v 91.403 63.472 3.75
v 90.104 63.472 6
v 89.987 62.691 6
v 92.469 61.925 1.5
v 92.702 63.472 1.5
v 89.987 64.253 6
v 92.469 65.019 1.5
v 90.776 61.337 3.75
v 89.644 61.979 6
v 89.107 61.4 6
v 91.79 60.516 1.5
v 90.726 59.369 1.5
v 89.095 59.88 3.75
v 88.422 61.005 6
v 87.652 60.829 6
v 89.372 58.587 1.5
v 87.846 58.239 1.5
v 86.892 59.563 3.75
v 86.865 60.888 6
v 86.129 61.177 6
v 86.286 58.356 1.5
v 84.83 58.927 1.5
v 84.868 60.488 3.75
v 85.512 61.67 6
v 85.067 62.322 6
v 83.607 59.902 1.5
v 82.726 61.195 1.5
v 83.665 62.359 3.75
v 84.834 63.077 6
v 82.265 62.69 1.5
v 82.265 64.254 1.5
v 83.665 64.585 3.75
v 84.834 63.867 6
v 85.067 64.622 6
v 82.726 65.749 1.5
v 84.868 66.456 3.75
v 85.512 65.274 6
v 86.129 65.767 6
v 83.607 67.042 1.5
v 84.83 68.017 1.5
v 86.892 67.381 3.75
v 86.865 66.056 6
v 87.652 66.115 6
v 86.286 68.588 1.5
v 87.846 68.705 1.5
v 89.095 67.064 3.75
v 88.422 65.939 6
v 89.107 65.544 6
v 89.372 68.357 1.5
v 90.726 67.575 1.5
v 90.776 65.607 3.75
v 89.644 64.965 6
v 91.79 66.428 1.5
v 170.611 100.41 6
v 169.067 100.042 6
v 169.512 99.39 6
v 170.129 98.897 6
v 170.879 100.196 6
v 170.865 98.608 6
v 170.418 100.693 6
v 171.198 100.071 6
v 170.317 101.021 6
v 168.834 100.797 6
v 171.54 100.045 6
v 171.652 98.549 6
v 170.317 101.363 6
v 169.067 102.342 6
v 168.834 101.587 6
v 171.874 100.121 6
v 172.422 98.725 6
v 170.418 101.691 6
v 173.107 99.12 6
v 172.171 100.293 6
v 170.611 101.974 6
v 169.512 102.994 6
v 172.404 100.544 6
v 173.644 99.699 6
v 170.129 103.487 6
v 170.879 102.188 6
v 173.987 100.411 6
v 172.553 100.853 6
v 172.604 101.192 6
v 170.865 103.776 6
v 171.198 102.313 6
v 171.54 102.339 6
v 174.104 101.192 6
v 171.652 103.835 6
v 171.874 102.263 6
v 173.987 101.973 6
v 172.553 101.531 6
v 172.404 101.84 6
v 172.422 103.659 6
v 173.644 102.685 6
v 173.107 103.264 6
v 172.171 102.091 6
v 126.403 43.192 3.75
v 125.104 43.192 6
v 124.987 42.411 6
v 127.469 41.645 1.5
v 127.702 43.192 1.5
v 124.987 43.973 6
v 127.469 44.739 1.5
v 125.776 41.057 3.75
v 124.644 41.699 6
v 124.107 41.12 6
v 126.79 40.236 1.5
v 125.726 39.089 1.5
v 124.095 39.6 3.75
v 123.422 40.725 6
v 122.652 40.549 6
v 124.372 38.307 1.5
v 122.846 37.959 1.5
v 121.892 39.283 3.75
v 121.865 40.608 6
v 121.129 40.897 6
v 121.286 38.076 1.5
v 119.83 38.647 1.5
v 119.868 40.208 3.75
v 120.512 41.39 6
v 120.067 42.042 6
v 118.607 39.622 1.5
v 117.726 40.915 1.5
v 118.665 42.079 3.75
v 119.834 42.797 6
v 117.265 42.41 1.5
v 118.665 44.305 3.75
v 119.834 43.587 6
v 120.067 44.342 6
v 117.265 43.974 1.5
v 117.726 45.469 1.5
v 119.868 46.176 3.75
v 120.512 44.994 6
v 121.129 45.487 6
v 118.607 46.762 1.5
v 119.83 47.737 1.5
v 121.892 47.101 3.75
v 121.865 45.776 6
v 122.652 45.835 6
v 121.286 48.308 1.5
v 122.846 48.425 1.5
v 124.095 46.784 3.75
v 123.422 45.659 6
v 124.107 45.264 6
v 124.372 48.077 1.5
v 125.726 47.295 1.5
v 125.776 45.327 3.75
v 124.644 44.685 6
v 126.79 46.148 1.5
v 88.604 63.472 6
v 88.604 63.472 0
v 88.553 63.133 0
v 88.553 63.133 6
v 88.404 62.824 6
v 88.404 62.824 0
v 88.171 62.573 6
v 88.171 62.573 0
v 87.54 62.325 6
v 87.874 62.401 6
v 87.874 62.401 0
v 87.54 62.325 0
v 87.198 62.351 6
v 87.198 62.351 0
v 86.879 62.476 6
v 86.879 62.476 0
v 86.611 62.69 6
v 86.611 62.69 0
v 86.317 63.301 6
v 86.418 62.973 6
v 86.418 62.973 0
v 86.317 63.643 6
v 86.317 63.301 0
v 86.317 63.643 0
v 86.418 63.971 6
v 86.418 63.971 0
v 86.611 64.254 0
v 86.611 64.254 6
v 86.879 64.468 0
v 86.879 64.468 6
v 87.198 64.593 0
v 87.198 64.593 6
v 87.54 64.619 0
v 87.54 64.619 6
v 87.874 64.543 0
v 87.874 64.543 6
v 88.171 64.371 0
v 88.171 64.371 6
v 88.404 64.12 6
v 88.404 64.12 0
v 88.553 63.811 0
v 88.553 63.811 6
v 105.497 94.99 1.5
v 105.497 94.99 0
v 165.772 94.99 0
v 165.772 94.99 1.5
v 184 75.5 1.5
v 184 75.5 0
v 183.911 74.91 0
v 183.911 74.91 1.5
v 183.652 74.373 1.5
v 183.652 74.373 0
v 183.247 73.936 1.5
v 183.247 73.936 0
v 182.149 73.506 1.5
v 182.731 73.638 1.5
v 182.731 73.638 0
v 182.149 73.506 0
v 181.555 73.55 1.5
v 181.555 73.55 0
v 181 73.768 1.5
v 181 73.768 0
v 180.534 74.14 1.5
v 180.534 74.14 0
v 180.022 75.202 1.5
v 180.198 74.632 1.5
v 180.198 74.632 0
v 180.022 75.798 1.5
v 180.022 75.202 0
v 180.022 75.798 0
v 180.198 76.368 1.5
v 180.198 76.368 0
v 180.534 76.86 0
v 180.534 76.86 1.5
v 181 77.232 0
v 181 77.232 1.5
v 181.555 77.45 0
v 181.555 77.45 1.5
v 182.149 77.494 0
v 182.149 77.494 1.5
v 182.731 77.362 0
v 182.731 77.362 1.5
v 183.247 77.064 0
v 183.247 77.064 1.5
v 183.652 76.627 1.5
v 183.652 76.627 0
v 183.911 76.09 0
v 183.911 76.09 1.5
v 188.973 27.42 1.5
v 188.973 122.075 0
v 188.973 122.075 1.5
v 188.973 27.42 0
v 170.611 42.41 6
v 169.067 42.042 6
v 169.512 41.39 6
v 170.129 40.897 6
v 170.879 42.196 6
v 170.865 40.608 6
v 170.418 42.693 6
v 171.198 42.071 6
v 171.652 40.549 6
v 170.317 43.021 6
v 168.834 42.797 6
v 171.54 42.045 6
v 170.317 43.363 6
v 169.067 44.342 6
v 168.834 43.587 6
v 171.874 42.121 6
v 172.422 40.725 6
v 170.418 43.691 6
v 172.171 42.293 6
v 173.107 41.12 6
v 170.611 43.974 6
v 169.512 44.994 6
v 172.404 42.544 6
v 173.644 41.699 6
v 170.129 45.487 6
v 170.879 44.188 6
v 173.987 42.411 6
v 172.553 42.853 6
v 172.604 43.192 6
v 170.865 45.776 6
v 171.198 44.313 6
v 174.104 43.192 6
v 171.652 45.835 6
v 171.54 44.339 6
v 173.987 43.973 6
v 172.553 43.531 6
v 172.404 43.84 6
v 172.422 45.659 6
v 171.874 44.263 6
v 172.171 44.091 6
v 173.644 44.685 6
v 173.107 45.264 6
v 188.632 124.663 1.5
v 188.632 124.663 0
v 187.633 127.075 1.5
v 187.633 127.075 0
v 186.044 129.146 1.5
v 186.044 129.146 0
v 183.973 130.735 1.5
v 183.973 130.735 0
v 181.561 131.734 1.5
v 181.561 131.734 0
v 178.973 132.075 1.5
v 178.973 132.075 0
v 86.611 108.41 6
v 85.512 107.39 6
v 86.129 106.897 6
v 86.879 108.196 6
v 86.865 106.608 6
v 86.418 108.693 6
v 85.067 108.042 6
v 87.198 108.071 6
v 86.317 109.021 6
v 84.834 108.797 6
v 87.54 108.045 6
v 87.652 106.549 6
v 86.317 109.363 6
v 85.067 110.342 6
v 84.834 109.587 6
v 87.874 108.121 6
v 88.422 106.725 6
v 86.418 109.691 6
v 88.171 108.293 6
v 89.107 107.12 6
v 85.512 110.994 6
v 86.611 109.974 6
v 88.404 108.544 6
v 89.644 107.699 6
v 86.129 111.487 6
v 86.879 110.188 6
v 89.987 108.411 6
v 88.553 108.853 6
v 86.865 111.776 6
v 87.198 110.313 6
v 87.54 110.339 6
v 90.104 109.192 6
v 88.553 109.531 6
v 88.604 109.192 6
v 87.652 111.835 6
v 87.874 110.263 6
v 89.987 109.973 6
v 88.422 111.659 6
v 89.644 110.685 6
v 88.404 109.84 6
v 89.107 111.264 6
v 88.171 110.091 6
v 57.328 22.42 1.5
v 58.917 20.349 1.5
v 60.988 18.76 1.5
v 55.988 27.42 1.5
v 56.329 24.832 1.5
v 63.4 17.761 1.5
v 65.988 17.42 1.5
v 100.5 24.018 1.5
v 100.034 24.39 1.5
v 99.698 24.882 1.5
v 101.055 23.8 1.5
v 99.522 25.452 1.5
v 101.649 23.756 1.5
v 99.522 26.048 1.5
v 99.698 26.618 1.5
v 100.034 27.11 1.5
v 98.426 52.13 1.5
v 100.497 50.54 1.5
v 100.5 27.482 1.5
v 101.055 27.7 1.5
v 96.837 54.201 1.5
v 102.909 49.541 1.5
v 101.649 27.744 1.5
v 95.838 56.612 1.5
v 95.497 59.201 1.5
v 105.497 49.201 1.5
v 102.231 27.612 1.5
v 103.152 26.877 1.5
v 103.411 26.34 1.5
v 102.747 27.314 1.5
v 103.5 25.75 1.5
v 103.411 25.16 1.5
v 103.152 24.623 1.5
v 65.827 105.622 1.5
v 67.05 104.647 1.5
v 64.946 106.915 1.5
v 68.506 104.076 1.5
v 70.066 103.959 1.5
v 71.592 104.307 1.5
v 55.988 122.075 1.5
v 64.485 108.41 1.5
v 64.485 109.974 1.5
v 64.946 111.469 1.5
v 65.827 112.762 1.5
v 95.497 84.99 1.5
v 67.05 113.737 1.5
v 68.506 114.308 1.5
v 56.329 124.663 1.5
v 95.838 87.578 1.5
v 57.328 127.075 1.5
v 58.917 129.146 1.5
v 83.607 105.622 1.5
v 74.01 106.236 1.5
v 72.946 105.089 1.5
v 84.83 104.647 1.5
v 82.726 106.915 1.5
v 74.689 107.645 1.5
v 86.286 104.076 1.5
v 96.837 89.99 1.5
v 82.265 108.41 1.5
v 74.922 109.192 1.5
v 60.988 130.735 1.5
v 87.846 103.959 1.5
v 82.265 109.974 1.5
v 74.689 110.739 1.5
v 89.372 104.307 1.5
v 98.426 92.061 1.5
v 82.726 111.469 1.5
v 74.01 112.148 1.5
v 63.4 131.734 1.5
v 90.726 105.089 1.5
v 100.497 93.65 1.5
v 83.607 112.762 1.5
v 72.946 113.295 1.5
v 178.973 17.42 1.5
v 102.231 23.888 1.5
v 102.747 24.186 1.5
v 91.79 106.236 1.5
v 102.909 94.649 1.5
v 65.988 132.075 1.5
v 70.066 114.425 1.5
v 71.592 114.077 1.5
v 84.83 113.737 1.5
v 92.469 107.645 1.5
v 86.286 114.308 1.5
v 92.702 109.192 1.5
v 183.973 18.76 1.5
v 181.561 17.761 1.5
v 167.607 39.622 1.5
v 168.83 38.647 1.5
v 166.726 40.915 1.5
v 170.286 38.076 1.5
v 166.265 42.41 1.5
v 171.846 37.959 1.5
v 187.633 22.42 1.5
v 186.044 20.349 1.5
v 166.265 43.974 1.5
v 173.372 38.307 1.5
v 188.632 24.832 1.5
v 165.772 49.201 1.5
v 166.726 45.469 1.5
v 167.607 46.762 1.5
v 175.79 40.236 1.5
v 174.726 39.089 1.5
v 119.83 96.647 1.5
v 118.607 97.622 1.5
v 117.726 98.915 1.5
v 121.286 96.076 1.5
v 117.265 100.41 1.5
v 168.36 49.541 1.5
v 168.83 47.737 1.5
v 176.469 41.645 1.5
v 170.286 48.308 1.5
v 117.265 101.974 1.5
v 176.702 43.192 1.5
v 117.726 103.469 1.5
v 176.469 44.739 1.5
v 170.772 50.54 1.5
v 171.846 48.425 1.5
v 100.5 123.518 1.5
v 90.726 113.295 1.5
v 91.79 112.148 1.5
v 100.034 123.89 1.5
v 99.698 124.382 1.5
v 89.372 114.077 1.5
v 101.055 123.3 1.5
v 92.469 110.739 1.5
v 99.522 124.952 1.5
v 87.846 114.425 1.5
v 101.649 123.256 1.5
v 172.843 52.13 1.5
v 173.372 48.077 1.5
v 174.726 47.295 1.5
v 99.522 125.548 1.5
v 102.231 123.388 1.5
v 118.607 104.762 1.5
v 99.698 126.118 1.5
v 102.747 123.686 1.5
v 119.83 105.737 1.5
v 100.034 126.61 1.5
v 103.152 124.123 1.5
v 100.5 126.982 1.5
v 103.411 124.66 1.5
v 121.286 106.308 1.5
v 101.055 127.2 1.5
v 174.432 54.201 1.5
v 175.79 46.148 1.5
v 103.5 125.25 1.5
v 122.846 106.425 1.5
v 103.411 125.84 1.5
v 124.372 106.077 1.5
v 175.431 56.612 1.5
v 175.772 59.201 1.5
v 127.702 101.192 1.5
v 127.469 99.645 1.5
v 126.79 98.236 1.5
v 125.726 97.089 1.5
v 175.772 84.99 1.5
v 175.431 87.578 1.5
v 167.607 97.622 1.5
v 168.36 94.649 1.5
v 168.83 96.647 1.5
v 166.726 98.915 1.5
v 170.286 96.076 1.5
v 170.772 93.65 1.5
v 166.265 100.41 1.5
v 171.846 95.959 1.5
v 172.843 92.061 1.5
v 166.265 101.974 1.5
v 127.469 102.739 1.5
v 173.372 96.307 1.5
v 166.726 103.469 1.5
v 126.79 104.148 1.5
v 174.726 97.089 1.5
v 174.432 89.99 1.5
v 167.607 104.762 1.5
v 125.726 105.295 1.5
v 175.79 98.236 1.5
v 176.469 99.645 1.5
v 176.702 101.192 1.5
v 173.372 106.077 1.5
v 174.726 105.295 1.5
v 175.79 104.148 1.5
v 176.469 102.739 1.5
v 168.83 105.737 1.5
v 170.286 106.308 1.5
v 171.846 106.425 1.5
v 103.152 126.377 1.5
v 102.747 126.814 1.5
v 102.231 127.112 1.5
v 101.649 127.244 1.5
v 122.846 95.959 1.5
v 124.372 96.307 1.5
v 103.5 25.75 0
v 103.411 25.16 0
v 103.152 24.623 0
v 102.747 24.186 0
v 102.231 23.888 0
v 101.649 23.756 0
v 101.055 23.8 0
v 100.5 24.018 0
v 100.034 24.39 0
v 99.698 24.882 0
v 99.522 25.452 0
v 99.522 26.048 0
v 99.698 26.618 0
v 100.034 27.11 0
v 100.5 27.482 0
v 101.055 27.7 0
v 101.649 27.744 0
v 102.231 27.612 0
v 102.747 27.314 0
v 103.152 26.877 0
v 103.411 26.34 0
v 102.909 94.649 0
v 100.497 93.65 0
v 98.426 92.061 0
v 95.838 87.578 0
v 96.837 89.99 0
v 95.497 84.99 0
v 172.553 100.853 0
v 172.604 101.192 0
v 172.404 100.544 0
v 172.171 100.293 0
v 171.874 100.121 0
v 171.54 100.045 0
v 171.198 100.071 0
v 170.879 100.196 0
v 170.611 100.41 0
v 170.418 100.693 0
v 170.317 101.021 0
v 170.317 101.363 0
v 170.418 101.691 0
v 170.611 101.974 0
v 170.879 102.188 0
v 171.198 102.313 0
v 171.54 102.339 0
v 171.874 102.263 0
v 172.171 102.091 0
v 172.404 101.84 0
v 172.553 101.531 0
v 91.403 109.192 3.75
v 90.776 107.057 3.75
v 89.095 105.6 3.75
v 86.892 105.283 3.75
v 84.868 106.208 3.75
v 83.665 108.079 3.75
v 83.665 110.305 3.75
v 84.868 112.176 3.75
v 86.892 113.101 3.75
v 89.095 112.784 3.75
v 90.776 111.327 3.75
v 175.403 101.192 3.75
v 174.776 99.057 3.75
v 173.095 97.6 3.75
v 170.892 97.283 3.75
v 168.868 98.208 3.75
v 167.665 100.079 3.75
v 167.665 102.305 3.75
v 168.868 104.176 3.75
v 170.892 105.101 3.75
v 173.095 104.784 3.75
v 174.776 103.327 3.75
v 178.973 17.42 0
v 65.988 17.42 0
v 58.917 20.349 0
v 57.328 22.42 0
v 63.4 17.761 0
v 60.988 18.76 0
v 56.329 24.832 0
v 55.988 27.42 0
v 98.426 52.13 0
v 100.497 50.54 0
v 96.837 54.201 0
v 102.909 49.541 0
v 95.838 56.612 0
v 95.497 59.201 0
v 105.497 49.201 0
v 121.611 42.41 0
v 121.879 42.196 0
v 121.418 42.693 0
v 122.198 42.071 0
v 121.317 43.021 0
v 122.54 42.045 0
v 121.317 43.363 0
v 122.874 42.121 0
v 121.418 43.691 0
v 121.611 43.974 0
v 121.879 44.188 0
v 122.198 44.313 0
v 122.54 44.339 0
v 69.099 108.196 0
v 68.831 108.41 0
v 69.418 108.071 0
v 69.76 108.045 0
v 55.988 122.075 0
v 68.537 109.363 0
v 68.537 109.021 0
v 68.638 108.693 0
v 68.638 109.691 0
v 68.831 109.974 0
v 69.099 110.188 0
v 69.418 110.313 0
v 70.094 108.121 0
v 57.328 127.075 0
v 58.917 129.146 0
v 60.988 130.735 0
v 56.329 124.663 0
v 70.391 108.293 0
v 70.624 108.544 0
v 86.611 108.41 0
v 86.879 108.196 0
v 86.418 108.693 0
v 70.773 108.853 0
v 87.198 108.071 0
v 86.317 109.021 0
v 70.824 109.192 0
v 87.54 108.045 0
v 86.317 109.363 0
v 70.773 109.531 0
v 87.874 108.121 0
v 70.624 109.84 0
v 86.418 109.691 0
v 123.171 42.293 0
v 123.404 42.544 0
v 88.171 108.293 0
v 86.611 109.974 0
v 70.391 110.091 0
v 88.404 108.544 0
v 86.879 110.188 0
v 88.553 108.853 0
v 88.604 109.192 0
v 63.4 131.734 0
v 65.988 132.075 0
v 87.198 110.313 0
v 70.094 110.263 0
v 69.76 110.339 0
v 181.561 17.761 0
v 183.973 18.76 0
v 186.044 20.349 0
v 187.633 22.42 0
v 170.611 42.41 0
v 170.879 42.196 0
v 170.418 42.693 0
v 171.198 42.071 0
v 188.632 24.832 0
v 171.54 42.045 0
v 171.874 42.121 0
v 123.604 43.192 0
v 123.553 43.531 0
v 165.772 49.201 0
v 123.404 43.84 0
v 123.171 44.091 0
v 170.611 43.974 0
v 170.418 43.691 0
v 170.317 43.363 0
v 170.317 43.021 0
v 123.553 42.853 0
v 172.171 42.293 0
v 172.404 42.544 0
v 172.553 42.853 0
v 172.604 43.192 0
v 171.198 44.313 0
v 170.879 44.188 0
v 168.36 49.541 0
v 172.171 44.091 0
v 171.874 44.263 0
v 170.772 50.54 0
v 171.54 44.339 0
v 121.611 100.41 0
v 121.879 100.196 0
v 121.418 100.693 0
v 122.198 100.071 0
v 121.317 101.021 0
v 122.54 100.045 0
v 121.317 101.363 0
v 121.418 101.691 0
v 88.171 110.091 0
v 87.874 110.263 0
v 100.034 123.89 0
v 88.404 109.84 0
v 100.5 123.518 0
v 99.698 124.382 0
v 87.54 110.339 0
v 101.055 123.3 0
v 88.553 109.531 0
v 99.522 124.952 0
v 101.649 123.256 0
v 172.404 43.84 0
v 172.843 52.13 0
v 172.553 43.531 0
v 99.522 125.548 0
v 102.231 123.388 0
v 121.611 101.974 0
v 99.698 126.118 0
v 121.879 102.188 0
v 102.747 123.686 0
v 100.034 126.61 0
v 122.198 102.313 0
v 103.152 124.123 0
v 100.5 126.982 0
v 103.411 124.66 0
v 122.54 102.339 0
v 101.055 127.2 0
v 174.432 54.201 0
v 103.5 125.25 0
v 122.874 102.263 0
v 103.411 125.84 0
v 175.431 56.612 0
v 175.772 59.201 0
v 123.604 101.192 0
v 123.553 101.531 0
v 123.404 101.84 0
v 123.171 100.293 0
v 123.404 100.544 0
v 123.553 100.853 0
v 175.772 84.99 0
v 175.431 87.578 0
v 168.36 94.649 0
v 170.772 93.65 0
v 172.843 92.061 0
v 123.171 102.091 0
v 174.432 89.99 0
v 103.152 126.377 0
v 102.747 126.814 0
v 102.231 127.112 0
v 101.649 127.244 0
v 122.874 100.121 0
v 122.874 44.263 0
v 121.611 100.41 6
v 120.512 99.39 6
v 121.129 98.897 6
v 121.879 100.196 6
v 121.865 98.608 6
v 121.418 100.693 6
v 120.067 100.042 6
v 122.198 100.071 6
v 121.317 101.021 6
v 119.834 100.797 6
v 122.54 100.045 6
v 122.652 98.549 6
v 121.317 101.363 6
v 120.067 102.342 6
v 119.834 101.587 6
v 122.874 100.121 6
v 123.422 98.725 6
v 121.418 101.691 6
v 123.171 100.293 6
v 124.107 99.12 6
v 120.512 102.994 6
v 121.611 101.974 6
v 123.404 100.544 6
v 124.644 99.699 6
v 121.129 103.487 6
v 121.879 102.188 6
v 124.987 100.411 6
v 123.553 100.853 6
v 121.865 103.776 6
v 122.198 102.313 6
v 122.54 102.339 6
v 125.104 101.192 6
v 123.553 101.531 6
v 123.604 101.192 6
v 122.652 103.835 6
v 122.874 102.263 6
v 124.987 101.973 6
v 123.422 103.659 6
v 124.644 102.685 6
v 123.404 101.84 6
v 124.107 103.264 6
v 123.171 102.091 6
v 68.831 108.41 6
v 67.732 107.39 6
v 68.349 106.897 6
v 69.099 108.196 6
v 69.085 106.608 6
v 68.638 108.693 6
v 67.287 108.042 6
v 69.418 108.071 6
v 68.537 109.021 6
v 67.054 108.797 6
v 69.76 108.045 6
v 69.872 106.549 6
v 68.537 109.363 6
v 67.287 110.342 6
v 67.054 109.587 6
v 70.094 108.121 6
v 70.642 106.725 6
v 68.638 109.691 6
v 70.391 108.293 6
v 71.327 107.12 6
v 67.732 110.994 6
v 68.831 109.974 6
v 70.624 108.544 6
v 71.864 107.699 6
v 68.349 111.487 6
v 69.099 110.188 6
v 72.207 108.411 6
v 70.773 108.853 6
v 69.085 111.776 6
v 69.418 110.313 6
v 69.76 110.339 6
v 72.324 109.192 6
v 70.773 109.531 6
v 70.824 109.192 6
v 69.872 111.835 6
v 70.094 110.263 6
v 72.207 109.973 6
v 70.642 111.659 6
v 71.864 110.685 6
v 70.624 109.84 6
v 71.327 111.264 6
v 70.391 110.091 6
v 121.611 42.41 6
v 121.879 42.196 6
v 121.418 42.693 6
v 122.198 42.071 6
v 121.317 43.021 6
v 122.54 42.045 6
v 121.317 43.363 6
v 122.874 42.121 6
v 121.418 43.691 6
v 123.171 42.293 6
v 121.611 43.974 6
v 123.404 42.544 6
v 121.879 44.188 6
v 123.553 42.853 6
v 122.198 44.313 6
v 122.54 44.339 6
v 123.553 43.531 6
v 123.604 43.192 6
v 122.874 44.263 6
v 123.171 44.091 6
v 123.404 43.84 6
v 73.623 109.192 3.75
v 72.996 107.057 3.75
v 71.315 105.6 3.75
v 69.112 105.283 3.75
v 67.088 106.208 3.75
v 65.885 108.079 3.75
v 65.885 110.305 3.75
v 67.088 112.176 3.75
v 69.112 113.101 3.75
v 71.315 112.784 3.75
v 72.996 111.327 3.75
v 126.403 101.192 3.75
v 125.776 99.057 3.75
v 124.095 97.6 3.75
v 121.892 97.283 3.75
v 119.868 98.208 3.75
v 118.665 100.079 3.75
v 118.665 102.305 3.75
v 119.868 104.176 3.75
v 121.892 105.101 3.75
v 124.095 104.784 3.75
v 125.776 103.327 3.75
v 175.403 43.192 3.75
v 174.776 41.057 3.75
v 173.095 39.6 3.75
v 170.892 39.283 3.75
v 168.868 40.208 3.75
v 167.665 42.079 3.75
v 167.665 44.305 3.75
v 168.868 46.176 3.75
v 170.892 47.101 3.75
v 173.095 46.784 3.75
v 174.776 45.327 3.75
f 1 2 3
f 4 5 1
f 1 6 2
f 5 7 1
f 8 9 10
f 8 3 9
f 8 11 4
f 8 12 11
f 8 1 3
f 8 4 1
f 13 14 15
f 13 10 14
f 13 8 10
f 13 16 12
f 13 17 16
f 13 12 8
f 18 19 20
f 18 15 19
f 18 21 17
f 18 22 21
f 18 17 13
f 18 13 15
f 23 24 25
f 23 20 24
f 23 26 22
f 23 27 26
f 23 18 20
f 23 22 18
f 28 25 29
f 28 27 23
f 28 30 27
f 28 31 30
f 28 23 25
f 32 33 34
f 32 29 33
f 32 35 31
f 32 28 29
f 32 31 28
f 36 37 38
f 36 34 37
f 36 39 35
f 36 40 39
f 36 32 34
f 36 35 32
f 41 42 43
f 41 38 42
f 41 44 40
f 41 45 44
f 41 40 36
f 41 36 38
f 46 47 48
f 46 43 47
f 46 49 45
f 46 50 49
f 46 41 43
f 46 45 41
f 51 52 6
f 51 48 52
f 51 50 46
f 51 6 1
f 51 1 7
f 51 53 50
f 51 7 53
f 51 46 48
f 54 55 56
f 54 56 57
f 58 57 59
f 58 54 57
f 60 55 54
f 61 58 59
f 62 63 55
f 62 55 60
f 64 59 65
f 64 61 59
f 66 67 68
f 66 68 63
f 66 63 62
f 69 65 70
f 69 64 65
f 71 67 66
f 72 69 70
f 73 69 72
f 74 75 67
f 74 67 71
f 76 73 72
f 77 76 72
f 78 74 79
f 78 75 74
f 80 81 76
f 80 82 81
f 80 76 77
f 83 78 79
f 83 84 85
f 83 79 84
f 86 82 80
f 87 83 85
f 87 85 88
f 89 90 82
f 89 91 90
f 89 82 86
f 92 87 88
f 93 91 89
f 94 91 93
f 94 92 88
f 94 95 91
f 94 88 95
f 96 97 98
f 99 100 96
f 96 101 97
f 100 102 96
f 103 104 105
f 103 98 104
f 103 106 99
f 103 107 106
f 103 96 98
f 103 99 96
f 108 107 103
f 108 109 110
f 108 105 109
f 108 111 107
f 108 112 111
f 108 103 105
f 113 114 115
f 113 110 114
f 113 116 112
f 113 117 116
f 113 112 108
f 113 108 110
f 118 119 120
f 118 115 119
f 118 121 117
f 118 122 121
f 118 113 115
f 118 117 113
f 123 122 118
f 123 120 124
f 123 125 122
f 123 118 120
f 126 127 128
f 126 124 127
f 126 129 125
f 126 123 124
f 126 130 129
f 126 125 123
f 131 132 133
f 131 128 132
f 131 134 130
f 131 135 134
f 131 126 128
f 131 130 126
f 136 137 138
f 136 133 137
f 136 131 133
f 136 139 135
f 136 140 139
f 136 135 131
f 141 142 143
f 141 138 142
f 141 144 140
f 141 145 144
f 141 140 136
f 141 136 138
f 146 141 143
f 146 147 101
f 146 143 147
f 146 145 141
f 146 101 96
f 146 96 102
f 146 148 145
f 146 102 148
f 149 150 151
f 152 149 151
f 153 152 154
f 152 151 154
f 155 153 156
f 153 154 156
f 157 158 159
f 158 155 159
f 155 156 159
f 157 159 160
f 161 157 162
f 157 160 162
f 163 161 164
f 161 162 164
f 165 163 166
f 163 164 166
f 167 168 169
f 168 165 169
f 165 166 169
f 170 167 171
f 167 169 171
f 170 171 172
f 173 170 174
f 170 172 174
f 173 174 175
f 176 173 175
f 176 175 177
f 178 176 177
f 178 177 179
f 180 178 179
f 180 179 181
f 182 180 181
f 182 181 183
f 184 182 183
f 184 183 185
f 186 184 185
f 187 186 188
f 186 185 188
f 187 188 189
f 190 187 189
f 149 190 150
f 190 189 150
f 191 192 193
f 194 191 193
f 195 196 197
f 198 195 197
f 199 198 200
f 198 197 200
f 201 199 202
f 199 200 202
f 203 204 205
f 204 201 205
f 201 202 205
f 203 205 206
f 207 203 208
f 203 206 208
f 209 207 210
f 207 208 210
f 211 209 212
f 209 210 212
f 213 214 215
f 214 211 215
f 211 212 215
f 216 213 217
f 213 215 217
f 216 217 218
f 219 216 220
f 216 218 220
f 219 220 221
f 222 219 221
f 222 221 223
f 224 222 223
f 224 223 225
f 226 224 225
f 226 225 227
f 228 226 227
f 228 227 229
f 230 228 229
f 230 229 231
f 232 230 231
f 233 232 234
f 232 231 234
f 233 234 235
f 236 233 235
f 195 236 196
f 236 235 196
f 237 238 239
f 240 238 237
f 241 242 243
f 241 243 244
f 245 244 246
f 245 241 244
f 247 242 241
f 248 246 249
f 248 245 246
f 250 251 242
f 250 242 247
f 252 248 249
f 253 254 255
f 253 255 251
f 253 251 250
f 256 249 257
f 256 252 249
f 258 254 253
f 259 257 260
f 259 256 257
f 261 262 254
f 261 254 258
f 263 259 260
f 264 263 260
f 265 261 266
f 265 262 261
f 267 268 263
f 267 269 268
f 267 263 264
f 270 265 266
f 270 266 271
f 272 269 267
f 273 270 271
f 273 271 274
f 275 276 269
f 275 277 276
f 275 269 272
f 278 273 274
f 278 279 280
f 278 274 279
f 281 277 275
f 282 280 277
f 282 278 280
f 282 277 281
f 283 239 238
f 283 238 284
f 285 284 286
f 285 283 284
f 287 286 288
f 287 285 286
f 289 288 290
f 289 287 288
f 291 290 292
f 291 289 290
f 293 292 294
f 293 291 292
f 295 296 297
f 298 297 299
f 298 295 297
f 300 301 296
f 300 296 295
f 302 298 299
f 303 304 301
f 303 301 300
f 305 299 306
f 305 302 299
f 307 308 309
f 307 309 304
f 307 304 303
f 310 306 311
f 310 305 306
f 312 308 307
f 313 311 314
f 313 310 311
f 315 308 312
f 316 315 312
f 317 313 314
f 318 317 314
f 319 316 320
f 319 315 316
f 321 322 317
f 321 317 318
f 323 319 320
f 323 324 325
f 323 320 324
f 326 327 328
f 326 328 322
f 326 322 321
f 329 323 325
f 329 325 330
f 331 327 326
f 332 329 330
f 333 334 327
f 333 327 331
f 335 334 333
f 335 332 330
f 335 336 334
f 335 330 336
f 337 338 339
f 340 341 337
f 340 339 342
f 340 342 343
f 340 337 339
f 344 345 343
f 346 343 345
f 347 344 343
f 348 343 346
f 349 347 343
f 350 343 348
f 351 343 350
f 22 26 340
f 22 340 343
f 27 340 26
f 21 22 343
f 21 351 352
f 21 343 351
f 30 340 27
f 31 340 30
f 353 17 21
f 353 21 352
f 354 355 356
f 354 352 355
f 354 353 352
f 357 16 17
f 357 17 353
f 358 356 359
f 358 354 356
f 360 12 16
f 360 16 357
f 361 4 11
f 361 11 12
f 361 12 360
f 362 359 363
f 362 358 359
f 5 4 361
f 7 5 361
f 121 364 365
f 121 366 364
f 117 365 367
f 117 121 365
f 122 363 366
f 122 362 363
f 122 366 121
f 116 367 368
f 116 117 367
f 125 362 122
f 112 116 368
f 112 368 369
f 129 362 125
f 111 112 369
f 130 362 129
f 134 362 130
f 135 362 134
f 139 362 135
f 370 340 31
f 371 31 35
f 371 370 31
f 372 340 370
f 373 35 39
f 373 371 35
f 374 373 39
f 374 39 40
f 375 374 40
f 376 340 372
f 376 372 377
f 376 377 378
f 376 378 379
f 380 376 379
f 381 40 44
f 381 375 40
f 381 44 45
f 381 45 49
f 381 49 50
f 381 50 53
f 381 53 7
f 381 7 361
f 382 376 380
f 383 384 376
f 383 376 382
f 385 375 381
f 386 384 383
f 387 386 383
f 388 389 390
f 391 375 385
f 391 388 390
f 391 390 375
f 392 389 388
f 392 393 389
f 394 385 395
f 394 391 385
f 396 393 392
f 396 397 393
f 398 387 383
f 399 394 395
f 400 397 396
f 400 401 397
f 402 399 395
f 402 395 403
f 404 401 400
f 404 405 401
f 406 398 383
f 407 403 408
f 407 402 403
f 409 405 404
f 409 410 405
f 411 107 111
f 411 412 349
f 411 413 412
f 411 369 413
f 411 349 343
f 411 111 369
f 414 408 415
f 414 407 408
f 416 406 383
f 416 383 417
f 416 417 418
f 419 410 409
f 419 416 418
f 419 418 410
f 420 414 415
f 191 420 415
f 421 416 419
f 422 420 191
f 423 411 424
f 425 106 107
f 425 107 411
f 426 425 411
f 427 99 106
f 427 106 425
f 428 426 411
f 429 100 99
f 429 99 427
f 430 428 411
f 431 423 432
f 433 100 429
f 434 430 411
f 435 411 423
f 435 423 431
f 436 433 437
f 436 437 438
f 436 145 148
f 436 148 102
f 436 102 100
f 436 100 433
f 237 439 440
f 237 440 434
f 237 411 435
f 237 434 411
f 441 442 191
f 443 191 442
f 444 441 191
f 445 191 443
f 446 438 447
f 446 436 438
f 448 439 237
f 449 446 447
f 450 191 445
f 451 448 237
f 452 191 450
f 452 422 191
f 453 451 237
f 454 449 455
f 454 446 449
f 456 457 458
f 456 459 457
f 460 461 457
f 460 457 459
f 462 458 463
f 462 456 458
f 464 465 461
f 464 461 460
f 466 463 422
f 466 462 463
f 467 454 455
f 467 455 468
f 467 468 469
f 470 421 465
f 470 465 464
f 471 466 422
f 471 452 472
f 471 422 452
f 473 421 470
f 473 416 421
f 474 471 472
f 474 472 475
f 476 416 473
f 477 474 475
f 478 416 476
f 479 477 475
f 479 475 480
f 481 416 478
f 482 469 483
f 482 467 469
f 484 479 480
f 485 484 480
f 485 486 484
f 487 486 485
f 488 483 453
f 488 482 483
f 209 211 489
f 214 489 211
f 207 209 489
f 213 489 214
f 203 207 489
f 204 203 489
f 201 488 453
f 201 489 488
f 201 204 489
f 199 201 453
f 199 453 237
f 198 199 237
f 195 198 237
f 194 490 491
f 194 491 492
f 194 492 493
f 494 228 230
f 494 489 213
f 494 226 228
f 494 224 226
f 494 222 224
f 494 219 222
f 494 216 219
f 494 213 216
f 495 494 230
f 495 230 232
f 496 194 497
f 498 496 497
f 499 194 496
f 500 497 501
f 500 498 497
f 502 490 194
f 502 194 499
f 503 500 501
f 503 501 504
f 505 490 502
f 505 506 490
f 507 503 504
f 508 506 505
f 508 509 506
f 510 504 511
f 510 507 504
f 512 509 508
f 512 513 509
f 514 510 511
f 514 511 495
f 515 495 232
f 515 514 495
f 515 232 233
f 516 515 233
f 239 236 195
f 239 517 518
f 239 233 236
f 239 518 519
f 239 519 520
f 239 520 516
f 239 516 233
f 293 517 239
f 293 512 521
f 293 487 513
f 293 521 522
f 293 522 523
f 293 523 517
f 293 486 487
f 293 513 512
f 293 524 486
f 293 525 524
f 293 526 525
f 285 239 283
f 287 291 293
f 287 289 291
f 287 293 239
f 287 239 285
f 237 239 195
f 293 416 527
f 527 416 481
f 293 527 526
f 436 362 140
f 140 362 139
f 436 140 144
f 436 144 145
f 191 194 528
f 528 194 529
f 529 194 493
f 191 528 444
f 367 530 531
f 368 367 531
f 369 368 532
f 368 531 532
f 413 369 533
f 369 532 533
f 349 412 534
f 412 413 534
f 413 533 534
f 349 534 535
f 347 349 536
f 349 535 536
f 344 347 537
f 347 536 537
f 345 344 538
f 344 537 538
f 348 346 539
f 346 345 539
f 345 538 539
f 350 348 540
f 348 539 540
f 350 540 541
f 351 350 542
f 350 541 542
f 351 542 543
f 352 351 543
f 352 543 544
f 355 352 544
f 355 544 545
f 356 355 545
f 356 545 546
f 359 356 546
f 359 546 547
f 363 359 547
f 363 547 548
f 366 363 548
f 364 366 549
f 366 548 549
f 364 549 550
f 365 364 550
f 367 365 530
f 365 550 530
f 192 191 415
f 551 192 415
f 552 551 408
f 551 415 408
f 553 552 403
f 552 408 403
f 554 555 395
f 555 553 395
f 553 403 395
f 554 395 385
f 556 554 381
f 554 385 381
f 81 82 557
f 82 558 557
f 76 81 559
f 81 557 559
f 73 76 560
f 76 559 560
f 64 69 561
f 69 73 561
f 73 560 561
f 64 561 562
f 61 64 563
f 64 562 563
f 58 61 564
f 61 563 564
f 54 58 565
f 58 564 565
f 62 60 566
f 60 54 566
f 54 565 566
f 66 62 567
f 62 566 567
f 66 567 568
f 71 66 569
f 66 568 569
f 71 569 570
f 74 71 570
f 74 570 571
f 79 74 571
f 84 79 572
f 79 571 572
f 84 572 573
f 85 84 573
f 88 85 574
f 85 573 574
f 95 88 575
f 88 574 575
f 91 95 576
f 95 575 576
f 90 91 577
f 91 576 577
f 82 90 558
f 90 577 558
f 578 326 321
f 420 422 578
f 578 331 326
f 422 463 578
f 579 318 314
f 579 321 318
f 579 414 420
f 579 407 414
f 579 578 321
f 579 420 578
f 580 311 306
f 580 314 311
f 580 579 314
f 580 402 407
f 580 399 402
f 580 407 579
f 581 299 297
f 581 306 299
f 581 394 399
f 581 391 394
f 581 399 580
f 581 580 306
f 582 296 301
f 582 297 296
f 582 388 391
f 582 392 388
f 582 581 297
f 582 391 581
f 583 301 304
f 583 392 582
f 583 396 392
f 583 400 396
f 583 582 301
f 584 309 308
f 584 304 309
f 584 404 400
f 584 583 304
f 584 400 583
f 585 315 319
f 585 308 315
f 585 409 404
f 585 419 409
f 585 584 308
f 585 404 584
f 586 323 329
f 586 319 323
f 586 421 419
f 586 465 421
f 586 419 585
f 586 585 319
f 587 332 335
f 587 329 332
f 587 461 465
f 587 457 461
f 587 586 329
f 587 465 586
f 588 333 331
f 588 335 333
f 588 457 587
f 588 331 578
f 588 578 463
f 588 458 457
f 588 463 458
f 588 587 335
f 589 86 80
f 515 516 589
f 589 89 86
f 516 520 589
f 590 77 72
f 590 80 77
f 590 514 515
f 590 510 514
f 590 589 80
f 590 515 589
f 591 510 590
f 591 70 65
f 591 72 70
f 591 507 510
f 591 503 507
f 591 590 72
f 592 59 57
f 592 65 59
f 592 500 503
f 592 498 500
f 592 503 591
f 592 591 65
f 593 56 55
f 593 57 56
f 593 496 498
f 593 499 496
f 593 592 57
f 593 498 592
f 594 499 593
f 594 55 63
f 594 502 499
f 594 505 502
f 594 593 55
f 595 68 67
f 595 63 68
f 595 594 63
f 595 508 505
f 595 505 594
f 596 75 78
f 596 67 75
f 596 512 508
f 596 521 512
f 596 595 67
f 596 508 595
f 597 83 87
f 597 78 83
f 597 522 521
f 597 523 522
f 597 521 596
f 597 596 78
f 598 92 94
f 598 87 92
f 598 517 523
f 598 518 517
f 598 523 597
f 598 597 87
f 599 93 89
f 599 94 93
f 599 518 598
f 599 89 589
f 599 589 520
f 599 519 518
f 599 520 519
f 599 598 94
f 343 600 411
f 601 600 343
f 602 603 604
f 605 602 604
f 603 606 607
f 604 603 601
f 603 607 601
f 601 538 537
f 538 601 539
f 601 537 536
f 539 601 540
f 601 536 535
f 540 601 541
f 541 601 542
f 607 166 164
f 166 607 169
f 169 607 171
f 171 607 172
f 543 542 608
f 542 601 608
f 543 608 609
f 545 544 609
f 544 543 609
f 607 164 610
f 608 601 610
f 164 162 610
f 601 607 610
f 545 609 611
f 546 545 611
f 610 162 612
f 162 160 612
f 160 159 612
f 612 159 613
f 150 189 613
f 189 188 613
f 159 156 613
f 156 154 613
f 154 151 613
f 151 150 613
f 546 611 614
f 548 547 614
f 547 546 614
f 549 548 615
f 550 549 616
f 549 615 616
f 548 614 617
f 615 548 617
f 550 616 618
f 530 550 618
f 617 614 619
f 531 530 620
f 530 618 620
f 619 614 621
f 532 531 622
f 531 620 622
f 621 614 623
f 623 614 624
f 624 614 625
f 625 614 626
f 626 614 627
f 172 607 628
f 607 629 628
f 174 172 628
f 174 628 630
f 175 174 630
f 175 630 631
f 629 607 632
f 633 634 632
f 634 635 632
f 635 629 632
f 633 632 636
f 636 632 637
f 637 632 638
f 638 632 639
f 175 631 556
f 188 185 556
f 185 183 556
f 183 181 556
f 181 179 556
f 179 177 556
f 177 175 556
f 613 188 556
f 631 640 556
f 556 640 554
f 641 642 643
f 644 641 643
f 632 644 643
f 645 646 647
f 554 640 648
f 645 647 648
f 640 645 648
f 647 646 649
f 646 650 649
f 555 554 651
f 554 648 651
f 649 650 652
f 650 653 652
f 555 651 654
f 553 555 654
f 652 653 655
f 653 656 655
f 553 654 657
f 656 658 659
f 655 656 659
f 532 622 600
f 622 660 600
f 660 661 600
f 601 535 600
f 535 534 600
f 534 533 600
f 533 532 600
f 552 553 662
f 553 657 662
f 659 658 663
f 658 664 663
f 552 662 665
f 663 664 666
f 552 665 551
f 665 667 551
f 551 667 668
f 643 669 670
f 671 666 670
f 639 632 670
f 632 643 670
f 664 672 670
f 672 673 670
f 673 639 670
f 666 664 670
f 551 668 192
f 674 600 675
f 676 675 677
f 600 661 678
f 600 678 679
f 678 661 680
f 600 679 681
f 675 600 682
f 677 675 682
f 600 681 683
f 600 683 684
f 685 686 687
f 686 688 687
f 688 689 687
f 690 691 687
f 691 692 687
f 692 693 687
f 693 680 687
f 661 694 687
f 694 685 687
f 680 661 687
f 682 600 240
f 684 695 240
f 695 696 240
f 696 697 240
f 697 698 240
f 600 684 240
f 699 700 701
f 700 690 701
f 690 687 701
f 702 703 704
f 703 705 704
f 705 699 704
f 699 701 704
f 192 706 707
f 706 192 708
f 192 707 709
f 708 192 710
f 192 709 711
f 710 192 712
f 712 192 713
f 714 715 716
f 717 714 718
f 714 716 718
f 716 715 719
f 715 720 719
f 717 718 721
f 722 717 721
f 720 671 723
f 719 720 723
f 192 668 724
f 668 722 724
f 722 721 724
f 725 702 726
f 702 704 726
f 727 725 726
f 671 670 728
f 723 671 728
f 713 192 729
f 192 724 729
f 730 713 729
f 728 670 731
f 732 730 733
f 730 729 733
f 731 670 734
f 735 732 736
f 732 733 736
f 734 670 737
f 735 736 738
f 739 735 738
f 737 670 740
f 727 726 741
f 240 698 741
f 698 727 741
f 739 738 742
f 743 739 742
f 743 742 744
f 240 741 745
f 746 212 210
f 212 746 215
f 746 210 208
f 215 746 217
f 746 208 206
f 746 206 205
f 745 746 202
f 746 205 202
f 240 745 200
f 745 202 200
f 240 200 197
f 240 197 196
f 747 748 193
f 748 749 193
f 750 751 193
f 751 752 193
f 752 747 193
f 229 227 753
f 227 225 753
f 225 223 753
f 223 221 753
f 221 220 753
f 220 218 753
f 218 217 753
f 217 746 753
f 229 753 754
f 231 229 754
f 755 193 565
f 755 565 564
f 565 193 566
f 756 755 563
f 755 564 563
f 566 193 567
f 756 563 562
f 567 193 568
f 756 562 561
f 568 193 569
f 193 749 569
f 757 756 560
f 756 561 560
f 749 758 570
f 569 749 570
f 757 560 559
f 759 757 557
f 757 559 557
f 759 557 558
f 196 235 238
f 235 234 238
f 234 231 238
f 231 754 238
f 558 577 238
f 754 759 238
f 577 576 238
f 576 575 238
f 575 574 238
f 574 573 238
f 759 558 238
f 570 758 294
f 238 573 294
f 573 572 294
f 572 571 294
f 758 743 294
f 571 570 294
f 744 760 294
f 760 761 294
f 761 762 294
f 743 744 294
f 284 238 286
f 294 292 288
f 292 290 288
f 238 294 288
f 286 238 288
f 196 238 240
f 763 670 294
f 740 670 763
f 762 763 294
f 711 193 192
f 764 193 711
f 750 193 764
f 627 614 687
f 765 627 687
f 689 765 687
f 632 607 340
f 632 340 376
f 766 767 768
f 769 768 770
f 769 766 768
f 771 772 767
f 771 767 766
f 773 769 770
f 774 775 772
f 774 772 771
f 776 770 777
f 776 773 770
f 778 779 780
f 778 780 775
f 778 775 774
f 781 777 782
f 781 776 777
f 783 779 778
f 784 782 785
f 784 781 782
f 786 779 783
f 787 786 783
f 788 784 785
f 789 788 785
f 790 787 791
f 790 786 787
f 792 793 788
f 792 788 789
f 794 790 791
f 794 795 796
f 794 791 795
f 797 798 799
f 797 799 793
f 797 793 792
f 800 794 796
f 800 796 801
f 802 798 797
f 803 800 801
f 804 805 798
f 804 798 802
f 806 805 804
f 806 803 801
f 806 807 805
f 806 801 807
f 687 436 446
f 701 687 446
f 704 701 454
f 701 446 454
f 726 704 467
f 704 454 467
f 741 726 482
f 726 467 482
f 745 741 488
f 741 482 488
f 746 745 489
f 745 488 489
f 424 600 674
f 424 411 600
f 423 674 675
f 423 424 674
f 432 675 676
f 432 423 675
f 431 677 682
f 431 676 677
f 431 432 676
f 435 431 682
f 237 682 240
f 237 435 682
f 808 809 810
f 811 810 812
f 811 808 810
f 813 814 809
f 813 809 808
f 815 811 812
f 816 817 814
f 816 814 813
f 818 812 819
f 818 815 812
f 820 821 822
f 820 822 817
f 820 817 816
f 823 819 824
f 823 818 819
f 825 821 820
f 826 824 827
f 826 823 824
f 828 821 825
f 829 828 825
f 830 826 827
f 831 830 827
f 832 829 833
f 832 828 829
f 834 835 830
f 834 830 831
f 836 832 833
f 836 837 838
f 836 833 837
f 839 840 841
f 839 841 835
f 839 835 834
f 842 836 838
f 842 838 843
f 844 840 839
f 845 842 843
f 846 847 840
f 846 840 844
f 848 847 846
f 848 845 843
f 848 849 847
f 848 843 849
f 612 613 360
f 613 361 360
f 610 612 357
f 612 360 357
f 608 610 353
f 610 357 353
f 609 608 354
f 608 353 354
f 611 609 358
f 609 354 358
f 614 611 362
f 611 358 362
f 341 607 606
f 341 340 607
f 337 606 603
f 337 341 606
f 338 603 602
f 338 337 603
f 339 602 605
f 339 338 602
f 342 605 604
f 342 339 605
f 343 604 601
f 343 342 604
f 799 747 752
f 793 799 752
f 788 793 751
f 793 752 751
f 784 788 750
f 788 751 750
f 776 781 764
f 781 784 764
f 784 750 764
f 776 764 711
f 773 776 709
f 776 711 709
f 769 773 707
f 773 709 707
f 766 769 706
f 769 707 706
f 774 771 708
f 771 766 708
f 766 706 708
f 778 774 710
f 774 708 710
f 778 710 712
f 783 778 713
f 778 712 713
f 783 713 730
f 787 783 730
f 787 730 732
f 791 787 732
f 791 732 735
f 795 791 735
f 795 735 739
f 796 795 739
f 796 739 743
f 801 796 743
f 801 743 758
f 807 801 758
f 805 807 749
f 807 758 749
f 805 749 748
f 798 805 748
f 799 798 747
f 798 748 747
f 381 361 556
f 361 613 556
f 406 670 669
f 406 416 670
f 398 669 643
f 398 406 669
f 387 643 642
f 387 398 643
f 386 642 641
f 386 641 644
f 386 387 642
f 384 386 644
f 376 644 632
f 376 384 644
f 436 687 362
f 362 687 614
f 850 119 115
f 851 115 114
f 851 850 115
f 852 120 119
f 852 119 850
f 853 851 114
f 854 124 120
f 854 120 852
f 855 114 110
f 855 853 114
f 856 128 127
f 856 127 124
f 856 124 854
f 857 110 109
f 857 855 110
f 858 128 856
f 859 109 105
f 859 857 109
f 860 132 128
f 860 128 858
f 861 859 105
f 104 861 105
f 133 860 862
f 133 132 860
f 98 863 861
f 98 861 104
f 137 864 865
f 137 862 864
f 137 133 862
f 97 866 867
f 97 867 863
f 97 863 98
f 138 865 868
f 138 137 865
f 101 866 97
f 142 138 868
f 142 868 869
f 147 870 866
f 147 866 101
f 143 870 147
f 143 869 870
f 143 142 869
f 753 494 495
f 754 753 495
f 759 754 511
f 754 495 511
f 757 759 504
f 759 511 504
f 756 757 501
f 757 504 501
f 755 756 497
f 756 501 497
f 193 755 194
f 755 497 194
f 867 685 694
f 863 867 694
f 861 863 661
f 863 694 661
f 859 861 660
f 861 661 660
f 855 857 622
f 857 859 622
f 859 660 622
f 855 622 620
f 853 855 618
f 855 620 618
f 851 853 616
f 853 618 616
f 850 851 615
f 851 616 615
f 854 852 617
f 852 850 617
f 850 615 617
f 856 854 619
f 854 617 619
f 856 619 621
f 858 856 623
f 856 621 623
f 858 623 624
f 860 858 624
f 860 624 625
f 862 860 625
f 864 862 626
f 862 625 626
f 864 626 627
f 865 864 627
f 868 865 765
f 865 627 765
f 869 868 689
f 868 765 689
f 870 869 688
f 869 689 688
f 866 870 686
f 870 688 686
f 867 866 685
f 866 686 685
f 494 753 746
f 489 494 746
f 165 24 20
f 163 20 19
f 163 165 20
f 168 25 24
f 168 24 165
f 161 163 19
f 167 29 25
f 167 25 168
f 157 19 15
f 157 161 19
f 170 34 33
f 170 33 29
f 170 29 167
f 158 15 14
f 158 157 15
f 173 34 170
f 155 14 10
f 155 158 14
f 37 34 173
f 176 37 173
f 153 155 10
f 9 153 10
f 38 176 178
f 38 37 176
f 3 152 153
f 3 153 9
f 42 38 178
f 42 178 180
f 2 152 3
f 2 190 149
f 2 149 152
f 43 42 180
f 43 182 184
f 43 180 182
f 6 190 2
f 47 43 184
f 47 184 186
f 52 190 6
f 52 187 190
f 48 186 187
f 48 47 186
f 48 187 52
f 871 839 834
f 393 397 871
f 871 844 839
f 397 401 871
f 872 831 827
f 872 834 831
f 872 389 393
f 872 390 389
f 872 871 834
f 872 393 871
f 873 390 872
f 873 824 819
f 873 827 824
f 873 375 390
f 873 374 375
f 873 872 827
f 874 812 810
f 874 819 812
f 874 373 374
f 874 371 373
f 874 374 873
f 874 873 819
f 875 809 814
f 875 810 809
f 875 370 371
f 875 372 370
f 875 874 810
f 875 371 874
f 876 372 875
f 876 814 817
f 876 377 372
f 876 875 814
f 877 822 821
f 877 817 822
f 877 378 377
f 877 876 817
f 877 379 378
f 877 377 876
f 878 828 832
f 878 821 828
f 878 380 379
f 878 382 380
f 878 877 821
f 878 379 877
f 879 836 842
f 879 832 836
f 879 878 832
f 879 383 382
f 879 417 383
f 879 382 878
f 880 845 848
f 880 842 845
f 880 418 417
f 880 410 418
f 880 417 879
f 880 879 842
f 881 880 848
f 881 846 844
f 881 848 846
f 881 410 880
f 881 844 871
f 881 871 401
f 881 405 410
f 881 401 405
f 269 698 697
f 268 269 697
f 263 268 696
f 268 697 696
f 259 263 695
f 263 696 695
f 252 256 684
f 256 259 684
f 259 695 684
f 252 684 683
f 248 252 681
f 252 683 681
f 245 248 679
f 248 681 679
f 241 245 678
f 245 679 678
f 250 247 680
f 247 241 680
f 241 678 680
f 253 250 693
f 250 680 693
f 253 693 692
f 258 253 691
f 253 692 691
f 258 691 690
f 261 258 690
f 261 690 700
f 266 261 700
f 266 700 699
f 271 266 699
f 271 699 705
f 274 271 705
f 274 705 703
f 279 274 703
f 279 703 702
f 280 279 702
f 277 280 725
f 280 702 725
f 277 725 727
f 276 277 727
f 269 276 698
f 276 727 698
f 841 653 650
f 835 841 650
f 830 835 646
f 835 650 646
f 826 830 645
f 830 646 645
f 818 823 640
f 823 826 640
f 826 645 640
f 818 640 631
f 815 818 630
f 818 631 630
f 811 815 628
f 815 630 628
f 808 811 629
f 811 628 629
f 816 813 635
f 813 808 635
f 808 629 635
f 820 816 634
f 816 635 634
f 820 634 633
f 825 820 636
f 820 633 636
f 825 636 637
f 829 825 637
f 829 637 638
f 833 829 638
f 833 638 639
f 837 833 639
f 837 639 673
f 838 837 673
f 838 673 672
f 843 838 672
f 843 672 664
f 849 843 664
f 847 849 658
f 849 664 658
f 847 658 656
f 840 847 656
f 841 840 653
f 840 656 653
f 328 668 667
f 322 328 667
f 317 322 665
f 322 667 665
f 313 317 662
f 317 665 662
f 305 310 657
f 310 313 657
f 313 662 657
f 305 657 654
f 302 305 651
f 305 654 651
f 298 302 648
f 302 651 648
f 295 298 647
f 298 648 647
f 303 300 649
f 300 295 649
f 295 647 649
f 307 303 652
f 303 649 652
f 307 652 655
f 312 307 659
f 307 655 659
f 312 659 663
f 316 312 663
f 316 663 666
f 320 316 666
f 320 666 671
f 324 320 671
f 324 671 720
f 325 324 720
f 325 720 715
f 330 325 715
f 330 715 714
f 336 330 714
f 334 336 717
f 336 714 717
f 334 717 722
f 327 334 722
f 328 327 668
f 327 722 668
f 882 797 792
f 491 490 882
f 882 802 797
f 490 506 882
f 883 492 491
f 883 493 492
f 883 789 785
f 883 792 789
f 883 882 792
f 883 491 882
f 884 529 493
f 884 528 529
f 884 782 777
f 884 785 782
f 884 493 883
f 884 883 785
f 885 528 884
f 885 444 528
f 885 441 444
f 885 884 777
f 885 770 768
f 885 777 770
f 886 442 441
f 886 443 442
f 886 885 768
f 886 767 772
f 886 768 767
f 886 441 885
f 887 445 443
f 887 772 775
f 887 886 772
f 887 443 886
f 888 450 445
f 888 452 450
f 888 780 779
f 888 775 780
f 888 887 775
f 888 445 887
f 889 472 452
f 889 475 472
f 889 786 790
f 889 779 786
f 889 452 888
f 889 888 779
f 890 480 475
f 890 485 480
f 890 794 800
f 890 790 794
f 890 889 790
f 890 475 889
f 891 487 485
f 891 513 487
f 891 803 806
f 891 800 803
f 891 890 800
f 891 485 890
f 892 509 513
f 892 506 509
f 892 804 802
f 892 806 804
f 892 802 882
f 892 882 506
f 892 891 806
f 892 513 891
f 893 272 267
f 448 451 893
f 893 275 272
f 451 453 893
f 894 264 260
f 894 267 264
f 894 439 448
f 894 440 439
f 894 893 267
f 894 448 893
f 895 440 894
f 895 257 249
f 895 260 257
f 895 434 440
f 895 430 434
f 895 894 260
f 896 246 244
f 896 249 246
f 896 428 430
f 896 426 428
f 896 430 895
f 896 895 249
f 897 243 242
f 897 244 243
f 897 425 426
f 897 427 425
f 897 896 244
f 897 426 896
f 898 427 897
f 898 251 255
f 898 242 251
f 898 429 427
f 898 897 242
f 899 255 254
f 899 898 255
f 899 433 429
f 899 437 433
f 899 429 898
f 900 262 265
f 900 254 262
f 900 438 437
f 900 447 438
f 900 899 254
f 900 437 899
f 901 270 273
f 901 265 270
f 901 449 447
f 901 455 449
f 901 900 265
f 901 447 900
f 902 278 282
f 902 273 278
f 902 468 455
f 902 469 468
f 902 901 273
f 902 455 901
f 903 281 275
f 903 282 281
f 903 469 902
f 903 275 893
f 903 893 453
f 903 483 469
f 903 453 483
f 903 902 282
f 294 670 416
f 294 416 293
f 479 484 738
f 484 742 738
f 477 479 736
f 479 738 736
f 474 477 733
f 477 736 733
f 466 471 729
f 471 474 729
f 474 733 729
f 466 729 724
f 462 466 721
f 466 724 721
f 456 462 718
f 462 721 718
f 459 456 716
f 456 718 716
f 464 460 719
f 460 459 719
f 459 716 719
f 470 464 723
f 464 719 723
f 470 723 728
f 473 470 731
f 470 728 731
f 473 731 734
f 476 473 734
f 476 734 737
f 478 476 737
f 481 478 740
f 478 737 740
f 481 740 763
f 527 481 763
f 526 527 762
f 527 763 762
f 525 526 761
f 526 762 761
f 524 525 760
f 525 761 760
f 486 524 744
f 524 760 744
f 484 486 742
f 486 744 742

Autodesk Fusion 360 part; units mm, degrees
sketch "Sketch1" plane through (0, 0, 0) normal (0, 0, 1) x (1, 0, 0)
  line L0 (0, 0) -> (203, 0) construction
  line L1 (203, 0) -> (203, 151) construction
  line L2 (203, 151) -> (0, 151) construction
  line L3 (0, 151) -> (0, 0) construction
  line L4 (101.5, 151) -> (101.5, 0) construction
  line L5 (0, 75.5) -> (203, 75.5) construction
  circle A0 centre (25.85, 110.5) radius 2
  circle A1 centre (61.05, 125.25) radius 2
  circle A2 centre (21, 75.5) radius 2
  circle A3 centre (101.5, 125.25) radius 2
  circle A4 centre (141.95, 125.25) radius 2
  circle A5 centre (177.15, 110.5) radius 2
  circle A6 centre (182, 75.5) radius 2
  circle A7 centre (25.85, 40.5) radius 2
  circle A8 centre (101.5, 25.75) radius 2
  circle A9 centre (61.05, 25.75) radius 2
  circle A10 centre (141.95, 25.75) radius 2
  circle A11 centre (177.15, 40.5) radius 2
  line L6 (122.4543, 101.192) -> (171.4543, 101.192) construction
  line L7 (171.4543, 101.192) -> (171.4543, 43.192) construction
  line L8 (171.4543, 43.192) -> (122.4543, 43.192) construction
  line L9 (122.4543, 43.192) -> (122.4543, 101.192) construction
  line L10 (118.9543, 124.692) -> (174.9543, 124.692) construction
  line L11 (174.9543, 124.692) -> (174.9543, 39.692) construction
  line L12 (174.9543, 39.692) -> (118.9543, 39.692) construction
  line L13 (118.9543, 39.692) -> (118.9543, 124.692) construction
  circle A12 centre (122.4543, 101.192) radius 1.15
  circle A13 centre (171.4543, 101.192) radius 1.15
  circle A14 centre (171.4543, 43.192) radius 1.15
  circle A15 centre (122.4543, 43.192) radius 1.15
  circle A16 centre (122.4543, 101.192) radius 2.65
  circle A17 centre (171.4543, 101.192) radius 2.65
  circle A18 centre (171.4543, 43.192) radius 2.65
  circle A19 centre (122.4543, 43.192) radius 2.65
  line L14 (55.9879, 132.0749) -> (188.973, 132.0749)
  line L15 (188.973, 132.0749) -> (188.973, 17.4198)
  line L16 (188.973, 17.4198) -> (55.9879, 17.4198)
  line L17 (55.9879, 17.4198) -> (55.9879, 132.0749)
  line L18 (69.6743, 109.192) -> (87.4543, 109.192) construction
  line L19 (87.4543, 109.192) -> (87.4543, 63.472) construction
  line L20 (87.4543, 63.472) -> (69.6743, 63.472) construction
  line L21 (69.6743, 63.472) -> (69.6743, 109.192) construction
  circle A20 centre (69.6743, 109.192) radius 1.15
  circle A21 centre (69.6743, 109.192) radius 2.65
  circle A22 centre (87.4543, 109.192) radius 2.65
  circle A23 centre (87.4543, 109.192) radius 1.15
  circle A24 centre (69.6743, 63.472) radius 2.65
  circle A25 centre (69.6743, 63.472) radius 1.15
  circle A26 centre (87.4543, 63.472) radius 2.65
  circle A27 centre (87.4543, 63.472) radius 1.15
  line L22 (95.4972, 94.9899) -> (175.7715, 94.9899)
  line L23 (175.7715, 94.9899) -> (175.7715, 49.2006)
  line L24 (175.7715, 49.2006) -> (95.4972, 49.2006)
  line L25 (95.4972, 49.2006) -> (95.4972, 94.9899)
  point P0 (61.05, 125.25)
  point P1 (25.85, 110.5)
  point P2 (177.15, 110.5)
  point P3 (141.95, 125.25)
  point P4 (177.15, 40.5)
  point P5 (141.95, 25.75)
  point P6 (61.05, 25.75)
  point P7 (25.85, 40.5)
  point P8 (101.5, 125.25)
  point P9 (21, 75.5)
  point P10 (182, 75.5)
  point P11 (101.5, 25.75)
  point P12 (61.05, 25.75)
  point P13 (141.95, 25.75)
  point P14 (177.15, 40.5)
  dimension "d1" = 203
  dimension "d2" = 151
  dimension "d3" = 161
  dimension "d4" = 151.3
  dimension "d5" = 80.9
  dimension "d6" = 70
  dimension "d7" = 99.5
  dimension "d8" = 99.5
  dimension "d10" = 4
  dimension "d12" = 4
  dimension "d14" = 4
  dimension "d16" = 4
  dimension "d19" = 49
  dimension "d20" = 58
  dimension "d21" = 56
  dimension "d22" = 85
  dimension "d23" = 3.5
  dimension "d24" = 3.5
  dimension "d25" = 2.3
  dimension "d26" = 2.3
  dimension "d27" = 2.3
  dimension "d28" = 2.3
  dimension "d29" = 1.5
  dimension "d30" = 1.5
  dimension "d31" = 1.5
  dimension "d32" = 1.5
  dimension "d41" = 45.72
  dimension "d42" = 17.78
  dimension "d43" = 2.3
  dimension "d44" = 1.5
  dimension "d47" = 17.78
  dimension "d48" = -45.72
  dimension "d54" = 35
  dimension "d55" = 8
extrude "Extrude2" add sketch "Sketch1" along normal blind 1.5 contours A1 | A4 | A5 | A9 | A10 | A11 | A16 | A17 | A18 | A19 | L14 L15 L16 L17 | A21 | A22 | A24 | A25 | A26
extrude "Extrude3" add sketch "Sketch1" along normal blind 6 contours A16 | A17 | A18 | A19 | A21 | A22 | A26
draft "Draft1" angle 30 neutral plane through (0, 0, 6) pull (0, 0, 1) 7 faces at (120.1931, 102.5738, 3) (171.5204, 103.8412, 3) (171.5204, 45.8412, 3) (125.0912, 43.4559, 3) (71.9356, 110.5738, 3) (89.7156, 110.5738, 3) (90.0912, 63.7359, 3)
fillet "Fillet1" radius 10 8 edges at (55.9879, 17.4198, 0.75) (188.973, 17.4198, 0.75) (188.973, 132.0749, 0.75) (55.9879, 132.0749, 0.75) (95.4972, 94.9899, 0.75) (95.4972, 49.2006, 0.75) (175.7715, 94.9899, 0.75) (175.7715, 49.2006, 0.75)
